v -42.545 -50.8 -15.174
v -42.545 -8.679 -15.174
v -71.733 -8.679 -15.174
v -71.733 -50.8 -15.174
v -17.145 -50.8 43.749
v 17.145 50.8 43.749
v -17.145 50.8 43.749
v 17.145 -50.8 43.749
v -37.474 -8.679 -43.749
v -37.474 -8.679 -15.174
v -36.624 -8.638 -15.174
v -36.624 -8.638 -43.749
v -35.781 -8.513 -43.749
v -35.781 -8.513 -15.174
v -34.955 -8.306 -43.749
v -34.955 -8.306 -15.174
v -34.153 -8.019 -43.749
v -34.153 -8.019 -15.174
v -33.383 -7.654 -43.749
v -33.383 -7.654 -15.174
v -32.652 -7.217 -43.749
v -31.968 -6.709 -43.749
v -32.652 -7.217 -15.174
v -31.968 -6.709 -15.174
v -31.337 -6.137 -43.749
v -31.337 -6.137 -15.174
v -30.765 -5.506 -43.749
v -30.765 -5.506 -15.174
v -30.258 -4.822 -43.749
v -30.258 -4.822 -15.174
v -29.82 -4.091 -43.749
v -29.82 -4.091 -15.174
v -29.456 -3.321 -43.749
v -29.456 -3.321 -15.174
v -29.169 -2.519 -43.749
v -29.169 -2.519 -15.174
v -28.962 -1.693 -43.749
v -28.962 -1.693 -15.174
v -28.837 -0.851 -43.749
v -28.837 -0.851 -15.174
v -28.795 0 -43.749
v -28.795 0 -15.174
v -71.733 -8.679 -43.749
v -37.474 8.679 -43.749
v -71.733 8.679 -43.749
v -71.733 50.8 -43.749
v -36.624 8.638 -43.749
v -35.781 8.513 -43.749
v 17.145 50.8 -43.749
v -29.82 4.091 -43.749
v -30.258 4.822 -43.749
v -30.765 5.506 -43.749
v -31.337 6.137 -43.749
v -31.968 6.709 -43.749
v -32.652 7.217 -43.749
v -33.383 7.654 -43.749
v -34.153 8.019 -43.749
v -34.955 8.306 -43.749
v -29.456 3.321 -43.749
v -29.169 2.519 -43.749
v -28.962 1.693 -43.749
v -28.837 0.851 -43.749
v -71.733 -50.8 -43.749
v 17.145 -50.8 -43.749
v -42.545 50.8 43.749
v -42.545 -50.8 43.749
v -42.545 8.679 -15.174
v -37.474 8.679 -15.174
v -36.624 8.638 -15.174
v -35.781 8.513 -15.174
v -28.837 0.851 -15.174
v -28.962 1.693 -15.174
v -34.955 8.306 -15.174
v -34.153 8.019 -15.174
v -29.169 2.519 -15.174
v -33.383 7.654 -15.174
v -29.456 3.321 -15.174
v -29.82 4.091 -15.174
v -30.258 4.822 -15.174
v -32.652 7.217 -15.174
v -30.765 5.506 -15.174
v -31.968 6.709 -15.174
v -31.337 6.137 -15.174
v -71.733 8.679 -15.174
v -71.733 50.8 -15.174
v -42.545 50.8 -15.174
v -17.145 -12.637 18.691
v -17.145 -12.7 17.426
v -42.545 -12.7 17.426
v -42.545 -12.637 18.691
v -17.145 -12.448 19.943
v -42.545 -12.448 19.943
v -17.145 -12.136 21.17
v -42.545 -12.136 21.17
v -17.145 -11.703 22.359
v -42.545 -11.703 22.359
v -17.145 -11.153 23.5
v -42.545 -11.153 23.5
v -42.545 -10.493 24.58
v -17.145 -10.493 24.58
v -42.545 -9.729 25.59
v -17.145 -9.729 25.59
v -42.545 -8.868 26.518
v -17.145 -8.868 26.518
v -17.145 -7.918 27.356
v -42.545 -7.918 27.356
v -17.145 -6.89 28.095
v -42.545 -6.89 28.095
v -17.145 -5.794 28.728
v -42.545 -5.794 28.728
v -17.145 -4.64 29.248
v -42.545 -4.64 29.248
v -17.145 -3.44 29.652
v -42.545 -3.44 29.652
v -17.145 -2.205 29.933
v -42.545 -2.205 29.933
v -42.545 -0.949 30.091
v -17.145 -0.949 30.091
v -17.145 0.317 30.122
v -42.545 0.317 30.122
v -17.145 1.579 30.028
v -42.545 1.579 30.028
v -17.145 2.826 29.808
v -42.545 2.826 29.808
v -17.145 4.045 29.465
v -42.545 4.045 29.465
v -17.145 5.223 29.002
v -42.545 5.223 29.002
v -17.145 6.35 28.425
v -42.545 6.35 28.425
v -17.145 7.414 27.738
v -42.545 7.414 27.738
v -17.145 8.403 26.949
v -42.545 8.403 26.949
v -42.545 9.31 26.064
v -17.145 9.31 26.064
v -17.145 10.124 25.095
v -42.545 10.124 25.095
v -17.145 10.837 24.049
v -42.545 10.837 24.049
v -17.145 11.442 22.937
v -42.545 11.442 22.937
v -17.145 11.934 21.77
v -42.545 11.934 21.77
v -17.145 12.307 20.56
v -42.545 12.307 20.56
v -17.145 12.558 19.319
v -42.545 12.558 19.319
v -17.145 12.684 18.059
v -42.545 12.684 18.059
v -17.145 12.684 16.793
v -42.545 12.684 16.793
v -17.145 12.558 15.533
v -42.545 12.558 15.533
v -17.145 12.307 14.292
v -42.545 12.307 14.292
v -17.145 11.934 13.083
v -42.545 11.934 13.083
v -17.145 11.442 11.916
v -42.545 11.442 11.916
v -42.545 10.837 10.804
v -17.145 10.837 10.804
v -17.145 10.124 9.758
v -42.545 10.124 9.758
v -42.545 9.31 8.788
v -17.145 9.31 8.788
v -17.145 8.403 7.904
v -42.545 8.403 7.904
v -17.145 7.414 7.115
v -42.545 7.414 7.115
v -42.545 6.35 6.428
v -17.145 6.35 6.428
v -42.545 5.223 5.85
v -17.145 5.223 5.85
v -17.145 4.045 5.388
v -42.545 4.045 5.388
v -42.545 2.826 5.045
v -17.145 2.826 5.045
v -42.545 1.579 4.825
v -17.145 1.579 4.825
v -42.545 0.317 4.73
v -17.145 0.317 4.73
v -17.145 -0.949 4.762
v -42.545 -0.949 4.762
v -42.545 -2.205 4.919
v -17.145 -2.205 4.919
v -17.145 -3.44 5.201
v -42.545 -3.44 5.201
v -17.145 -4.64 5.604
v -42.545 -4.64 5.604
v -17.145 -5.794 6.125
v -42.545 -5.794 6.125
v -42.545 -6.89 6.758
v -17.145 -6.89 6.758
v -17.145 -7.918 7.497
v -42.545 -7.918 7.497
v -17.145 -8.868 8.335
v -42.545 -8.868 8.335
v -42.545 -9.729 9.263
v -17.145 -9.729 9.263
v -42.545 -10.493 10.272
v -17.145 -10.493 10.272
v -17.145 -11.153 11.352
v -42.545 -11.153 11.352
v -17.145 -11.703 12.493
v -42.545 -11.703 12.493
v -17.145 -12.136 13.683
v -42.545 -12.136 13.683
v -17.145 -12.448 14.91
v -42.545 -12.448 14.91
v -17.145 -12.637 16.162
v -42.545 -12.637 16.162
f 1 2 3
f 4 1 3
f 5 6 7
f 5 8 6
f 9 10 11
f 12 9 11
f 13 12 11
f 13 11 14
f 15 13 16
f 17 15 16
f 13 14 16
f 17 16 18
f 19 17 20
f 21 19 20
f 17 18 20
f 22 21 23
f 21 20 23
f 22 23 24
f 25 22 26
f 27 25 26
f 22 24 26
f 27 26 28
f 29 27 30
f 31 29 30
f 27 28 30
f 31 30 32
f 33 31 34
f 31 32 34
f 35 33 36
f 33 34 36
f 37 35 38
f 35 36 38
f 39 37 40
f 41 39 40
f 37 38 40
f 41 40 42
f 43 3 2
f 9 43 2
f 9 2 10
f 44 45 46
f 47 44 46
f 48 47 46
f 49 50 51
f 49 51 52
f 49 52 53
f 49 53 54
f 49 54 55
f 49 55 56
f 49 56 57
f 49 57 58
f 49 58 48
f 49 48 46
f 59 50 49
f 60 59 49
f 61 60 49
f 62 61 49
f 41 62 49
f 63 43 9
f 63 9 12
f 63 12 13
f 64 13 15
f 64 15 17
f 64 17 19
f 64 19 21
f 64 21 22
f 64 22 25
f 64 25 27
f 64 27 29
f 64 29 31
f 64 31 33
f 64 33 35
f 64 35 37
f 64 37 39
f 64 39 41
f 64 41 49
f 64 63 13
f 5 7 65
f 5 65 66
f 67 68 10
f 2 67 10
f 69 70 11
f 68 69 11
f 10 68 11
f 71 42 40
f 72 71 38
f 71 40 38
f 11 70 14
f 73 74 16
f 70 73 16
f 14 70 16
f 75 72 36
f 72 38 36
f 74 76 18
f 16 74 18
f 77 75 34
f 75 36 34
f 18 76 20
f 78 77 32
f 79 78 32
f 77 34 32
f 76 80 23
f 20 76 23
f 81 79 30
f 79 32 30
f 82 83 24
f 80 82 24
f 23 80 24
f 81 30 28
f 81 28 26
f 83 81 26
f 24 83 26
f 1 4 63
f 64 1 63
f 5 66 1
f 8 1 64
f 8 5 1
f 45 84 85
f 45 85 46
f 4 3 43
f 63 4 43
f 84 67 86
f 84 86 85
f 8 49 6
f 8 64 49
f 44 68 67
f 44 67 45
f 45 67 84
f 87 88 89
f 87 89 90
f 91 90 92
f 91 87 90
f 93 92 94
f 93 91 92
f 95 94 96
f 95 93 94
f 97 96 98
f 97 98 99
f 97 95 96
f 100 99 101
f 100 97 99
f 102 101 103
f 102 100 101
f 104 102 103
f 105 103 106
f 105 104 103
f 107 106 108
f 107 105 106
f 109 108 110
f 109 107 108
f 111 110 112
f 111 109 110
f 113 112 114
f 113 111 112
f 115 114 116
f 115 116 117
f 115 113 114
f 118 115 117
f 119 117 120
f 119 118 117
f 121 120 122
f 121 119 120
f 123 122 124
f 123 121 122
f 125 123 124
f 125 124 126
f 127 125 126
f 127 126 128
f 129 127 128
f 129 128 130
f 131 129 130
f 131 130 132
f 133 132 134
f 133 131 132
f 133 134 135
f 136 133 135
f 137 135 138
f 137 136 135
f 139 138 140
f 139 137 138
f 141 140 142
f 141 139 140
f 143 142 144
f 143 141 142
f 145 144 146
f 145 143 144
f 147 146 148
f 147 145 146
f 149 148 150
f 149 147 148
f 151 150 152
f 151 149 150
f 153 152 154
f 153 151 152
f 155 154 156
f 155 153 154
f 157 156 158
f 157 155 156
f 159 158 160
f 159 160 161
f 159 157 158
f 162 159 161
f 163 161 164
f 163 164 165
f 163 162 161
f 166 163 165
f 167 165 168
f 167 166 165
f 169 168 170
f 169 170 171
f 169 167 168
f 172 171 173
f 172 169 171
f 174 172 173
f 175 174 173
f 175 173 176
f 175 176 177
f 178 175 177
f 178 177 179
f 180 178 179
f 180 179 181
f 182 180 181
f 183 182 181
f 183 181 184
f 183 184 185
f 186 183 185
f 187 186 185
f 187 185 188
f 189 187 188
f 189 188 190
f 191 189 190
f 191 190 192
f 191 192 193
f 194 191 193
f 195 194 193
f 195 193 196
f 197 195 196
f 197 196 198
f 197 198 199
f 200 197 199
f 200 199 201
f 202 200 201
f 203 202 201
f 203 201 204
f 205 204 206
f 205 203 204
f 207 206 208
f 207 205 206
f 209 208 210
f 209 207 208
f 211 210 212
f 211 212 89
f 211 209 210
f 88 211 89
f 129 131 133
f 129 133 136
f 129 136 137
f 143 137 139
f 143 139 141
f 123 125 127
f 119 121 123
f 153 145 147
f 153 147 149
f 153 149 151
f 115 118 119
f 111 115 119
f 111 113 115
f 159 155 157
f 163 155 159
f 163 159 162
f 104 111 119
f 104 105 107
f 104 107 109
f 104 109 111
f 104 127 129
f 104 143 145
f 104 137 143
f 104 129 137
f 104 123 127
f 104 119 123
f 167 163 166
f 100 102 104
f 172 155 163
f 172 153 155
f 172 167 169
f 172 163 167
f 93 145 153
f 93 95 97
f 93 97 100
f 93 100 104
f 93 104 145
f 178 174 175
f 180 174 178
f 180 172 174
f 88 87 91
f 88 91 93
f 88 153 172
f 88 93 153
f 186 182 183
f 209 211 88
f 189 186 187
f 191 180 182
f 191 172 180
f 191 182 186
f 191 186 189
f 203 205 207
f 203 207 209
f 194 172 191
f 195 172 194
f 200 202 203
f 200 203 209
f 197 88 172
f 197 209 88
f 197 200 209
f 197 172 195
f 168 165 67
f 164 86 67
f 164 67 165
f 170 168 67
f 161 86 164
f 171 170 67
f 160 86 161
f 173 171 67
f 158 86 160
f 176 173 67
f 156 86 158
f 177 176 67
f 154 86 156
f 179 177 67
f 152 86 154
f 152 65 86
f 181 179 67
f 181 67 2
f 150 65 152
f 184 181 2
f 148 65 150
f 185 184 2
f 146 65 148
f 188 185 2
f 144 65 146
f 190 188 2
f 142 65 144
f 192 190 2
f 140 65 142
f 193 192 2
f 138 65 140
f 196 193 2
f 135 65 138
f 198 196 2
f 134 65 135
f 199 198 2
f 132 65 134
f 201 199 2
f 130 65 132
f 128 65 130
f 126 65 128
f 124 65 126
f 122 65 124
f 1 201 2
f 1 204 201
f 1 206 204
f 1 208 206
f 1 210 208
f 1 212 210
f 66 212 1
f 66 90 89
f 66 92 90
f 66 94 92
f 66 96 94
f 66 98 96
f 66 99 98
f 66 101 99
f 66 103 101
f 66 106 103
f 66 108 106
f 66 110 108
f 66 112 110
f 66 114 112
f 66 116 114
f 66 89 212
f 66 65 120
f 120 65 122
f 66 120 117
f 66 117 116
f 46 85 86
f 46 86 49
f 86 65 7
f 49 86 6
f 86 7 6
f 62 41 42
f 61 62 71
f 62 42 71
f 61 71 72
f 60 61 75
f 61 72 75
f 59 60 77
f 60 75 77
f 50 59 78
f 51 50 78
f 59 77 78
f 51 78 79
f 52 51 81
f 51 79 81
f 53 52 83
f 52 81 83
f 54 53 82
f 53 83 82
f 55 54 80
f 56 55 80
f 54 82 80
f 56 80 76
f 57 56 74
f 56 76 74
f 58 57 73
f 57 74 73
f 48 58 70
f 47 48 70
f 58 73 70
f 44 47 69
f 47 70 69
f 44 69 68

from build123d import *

# Parameters (mm, degrees)
F1_DEPTH = 50.8
F3_DEPTH = 28.575003
F4_W     = 101.6
F4_H     = 58.923625
F4_R     = 12.7
F5_DEPTH = 25.4


with BuildPart() as f1:
    # F0 (on Front) → F1 (new body, symmetric)
    with BuildSketch(Plane.XZ):
        Polygon((17.145002, -15.174311), (17.145002, 43.749314), (-17.145002, 43.749314), (-17.145002, -15.174311), (-71.733102, -15.174311), (-71.733102, -43.749314), (-17.145002, -43.749314), (17.145002, -43.749314), align=None)
    extrude(amount=F1_DEPTH, both=True)

    # F2 (on face) → F3 (cut, through all)
    with BuildSketch(Plane.XY.offset(-15.174311)):
        with BuildLine():
            ThreePointArc((-37.474338, -8.679342), (-46.153679, 0), (-37.474338, 8.679342))
            Line((-37.474338, 8.679342), (-71.733102, 8.679342))
            Line((-71.733102, 8.679342), (-71.733102, -8.679342))
            Line((-71.733102, -8.679342), (-37.474338, -8.679342))
        make_face()
        with BuildLine():
            ThreePointArc((-37.474338, -8.679342), (-31.337117, -6.137221), (-28.794996, 0))
            ThreePointArc((-28.794996, 0), (-31.337117, 6.137221), (-37.474338, 8.679342))
            ThreePointArc((-37.474338, 8.679342), (-46.153679, 0), (-37.474338, -8.679342))
        make_face()
    extrude(amount=-F3_DEPTH, mode=Mode.SUBTRACT)

    # F4 (on face) → F5 (join)
    with BuildSketch(Plane(origin=(-17.145002, 0, 0), x_dir=(0, -1, 0), z_dir=(-1, 0, 0))):
        with Locations((0, 14.287501)):
            Rectangle(F4_W, F4_H)
        with Locations((0, 17.426297)):
            Circle(F4_R, mode=Mode.SUBTRACT)
    extrude(amount=F5_DEPTH)


solid = f1.part
